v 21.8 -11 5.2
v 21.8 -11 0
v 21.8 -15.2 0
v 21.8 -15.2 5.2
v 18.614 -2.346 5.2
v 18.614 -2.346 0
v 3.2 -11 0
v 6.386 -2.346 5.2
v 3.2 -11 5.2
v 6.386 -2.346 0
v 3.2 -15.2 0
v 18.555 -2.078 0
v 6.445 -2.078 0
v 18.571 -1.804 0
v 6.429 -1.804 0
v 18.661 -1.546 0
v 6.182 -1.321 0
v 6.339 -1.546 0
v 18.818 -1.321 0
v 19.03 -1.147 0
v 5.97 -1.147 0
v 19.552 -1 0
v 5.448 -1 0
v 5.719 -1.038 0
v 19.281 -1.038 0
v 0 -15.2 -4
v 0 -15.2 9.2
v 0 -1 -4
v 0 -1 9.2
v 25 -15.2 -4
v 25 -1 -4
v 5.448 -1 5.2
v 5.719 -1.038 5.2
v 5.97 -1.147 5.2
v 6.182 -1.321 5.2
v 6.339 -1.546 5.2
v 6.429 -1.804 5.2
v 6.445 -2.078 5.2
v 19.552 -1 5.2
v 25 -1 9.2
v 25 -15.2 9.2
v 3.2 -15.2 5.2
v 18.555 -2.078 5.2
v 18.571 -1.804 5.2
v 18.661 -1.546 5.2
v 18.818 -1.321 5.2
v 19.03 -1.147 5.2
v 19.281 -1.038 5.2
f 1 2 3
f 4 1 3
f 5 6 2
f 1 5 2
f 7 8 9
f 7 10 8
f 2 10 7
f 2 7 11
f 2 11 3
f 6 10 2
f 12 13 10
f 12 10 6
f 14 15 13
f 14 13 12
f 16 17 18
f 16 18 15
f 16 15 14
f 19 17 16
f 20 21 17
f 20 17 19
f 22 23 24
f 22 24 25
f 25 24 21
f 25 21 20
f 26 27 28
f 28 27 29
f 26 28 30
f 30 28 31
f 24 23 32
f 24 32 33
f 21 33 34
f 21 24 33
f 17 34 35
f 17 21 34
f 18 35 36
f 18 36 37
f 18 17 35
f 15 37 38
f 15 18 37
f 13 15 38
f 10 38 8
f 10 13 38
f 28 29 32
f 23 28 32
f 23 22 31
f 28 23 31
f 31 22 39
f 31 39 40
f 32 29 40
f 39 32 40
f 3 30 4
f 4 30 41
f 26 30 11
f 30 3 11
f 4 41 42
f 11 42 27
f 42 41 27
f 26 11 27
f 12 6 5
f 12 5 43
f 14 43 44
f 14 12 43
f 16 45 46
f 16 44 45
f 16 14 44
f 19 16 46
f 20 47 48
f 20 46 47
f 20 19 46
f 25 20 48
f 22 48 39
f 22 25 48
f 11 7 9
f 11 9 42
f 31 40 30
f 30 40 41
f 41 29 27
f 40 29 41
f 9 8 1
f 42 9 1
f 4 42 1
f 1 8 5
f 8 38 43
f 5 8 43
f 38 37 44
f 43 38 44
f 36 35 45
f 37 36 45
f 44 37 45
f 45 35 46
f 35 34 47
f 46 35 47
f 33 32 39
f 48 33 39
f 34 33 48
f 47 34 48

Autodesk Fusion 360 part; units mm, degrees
sketch "Sketch1" plane through (0, 0, 0) normal (0, 0, 1) x (1, 0, 0)
  line L0 (0, 0) -> (25, 0)
  line L1 (25, 0) -> (25, -15.2)
  line L2 (25, -15.2) -> (0, -15.2)
  line L3 (0, -15.2) -> (0, 0)
  line L4 (7.25, 0) -> (3.2, -11)
  line L5 (17.75, 0) -> (21.8, -11)
  line L6 (3.2, -11) -> (3.2, -15.2)
  line L7 (21.8, -11) -> (21.8, -15.2)
  line L8 (3.2, -15.2) -> (21.8, -15.2) construction
  line L9 (12.5, -8.3) -> (25, -8.3) construction
  line L10 (12.5, -8.3) -> (0, -8.3) construction
  line L11 (0, 0) -> (7.25, 0) construction
  line L12 (17.75, 0) -> (25, 0) construction
  line L13 (36.4201, 0) -> (32.3701, -11.4) construction
  line L14 (32.3701, -11.4) -> (32.3701, -15.2) construction
  line L15 (32.3701, -15.2) -> (50.1701, -15.2) construction
  line L16 (50.1701, -15.2) -> (50.1701, -11.4) construction
  line L17 (50.1701, -11.4) -> (46.1201, 0) construction
  line L18 (36.4201, 0) -> (46.1201, 0) construction
  dimension "d1" = 25
  dimension "d2" = 15.2
  dimension "d3" = 10.5
  dimension "d5" = 18.6
  dimension "d10" = 11
  dimension "d14" = 8.3
  dimension "d26" = 3.8
  dimension "d27" = 17.8
  dimension "d28" = 9.7
  dimension "d29" = 15.2
extrude "Extrude1" add sketch "Sketch1" against normal blind 4 makes body 1
extrude "Extrude2" add sketch "Sketch1" along normal blind 5.2 contours L0 L2 L3 L4 L6 | L0 L1 L2 L5 L7 bodies 1
extrude "Extrude3" add sketch "Sketch1" along normal blind 4 from surface at 5.2 separate body makes body 2
combine "Combine1" operation add target body 1 tool bodies 2
extrude "Extrude5" cut 1 faces at (22.5833, 0, 1.7333) along direction (0, -1, 0) blind 1 on bodies 1 bodies 1
fillet "Fillet2" radius 1 2 edges at (6.8818, -1, 2.6) (18.1182, -1, 2.6) on bodies 1
equation "d3 = 9.7 mm + 0.8 mm"
equation "d5 = 17.8 mm + 0.8 mm"
equation "d14 = 8.4 mm - 0.1 mm"
equation "d17 = 5 mm + 0.2 mm"
